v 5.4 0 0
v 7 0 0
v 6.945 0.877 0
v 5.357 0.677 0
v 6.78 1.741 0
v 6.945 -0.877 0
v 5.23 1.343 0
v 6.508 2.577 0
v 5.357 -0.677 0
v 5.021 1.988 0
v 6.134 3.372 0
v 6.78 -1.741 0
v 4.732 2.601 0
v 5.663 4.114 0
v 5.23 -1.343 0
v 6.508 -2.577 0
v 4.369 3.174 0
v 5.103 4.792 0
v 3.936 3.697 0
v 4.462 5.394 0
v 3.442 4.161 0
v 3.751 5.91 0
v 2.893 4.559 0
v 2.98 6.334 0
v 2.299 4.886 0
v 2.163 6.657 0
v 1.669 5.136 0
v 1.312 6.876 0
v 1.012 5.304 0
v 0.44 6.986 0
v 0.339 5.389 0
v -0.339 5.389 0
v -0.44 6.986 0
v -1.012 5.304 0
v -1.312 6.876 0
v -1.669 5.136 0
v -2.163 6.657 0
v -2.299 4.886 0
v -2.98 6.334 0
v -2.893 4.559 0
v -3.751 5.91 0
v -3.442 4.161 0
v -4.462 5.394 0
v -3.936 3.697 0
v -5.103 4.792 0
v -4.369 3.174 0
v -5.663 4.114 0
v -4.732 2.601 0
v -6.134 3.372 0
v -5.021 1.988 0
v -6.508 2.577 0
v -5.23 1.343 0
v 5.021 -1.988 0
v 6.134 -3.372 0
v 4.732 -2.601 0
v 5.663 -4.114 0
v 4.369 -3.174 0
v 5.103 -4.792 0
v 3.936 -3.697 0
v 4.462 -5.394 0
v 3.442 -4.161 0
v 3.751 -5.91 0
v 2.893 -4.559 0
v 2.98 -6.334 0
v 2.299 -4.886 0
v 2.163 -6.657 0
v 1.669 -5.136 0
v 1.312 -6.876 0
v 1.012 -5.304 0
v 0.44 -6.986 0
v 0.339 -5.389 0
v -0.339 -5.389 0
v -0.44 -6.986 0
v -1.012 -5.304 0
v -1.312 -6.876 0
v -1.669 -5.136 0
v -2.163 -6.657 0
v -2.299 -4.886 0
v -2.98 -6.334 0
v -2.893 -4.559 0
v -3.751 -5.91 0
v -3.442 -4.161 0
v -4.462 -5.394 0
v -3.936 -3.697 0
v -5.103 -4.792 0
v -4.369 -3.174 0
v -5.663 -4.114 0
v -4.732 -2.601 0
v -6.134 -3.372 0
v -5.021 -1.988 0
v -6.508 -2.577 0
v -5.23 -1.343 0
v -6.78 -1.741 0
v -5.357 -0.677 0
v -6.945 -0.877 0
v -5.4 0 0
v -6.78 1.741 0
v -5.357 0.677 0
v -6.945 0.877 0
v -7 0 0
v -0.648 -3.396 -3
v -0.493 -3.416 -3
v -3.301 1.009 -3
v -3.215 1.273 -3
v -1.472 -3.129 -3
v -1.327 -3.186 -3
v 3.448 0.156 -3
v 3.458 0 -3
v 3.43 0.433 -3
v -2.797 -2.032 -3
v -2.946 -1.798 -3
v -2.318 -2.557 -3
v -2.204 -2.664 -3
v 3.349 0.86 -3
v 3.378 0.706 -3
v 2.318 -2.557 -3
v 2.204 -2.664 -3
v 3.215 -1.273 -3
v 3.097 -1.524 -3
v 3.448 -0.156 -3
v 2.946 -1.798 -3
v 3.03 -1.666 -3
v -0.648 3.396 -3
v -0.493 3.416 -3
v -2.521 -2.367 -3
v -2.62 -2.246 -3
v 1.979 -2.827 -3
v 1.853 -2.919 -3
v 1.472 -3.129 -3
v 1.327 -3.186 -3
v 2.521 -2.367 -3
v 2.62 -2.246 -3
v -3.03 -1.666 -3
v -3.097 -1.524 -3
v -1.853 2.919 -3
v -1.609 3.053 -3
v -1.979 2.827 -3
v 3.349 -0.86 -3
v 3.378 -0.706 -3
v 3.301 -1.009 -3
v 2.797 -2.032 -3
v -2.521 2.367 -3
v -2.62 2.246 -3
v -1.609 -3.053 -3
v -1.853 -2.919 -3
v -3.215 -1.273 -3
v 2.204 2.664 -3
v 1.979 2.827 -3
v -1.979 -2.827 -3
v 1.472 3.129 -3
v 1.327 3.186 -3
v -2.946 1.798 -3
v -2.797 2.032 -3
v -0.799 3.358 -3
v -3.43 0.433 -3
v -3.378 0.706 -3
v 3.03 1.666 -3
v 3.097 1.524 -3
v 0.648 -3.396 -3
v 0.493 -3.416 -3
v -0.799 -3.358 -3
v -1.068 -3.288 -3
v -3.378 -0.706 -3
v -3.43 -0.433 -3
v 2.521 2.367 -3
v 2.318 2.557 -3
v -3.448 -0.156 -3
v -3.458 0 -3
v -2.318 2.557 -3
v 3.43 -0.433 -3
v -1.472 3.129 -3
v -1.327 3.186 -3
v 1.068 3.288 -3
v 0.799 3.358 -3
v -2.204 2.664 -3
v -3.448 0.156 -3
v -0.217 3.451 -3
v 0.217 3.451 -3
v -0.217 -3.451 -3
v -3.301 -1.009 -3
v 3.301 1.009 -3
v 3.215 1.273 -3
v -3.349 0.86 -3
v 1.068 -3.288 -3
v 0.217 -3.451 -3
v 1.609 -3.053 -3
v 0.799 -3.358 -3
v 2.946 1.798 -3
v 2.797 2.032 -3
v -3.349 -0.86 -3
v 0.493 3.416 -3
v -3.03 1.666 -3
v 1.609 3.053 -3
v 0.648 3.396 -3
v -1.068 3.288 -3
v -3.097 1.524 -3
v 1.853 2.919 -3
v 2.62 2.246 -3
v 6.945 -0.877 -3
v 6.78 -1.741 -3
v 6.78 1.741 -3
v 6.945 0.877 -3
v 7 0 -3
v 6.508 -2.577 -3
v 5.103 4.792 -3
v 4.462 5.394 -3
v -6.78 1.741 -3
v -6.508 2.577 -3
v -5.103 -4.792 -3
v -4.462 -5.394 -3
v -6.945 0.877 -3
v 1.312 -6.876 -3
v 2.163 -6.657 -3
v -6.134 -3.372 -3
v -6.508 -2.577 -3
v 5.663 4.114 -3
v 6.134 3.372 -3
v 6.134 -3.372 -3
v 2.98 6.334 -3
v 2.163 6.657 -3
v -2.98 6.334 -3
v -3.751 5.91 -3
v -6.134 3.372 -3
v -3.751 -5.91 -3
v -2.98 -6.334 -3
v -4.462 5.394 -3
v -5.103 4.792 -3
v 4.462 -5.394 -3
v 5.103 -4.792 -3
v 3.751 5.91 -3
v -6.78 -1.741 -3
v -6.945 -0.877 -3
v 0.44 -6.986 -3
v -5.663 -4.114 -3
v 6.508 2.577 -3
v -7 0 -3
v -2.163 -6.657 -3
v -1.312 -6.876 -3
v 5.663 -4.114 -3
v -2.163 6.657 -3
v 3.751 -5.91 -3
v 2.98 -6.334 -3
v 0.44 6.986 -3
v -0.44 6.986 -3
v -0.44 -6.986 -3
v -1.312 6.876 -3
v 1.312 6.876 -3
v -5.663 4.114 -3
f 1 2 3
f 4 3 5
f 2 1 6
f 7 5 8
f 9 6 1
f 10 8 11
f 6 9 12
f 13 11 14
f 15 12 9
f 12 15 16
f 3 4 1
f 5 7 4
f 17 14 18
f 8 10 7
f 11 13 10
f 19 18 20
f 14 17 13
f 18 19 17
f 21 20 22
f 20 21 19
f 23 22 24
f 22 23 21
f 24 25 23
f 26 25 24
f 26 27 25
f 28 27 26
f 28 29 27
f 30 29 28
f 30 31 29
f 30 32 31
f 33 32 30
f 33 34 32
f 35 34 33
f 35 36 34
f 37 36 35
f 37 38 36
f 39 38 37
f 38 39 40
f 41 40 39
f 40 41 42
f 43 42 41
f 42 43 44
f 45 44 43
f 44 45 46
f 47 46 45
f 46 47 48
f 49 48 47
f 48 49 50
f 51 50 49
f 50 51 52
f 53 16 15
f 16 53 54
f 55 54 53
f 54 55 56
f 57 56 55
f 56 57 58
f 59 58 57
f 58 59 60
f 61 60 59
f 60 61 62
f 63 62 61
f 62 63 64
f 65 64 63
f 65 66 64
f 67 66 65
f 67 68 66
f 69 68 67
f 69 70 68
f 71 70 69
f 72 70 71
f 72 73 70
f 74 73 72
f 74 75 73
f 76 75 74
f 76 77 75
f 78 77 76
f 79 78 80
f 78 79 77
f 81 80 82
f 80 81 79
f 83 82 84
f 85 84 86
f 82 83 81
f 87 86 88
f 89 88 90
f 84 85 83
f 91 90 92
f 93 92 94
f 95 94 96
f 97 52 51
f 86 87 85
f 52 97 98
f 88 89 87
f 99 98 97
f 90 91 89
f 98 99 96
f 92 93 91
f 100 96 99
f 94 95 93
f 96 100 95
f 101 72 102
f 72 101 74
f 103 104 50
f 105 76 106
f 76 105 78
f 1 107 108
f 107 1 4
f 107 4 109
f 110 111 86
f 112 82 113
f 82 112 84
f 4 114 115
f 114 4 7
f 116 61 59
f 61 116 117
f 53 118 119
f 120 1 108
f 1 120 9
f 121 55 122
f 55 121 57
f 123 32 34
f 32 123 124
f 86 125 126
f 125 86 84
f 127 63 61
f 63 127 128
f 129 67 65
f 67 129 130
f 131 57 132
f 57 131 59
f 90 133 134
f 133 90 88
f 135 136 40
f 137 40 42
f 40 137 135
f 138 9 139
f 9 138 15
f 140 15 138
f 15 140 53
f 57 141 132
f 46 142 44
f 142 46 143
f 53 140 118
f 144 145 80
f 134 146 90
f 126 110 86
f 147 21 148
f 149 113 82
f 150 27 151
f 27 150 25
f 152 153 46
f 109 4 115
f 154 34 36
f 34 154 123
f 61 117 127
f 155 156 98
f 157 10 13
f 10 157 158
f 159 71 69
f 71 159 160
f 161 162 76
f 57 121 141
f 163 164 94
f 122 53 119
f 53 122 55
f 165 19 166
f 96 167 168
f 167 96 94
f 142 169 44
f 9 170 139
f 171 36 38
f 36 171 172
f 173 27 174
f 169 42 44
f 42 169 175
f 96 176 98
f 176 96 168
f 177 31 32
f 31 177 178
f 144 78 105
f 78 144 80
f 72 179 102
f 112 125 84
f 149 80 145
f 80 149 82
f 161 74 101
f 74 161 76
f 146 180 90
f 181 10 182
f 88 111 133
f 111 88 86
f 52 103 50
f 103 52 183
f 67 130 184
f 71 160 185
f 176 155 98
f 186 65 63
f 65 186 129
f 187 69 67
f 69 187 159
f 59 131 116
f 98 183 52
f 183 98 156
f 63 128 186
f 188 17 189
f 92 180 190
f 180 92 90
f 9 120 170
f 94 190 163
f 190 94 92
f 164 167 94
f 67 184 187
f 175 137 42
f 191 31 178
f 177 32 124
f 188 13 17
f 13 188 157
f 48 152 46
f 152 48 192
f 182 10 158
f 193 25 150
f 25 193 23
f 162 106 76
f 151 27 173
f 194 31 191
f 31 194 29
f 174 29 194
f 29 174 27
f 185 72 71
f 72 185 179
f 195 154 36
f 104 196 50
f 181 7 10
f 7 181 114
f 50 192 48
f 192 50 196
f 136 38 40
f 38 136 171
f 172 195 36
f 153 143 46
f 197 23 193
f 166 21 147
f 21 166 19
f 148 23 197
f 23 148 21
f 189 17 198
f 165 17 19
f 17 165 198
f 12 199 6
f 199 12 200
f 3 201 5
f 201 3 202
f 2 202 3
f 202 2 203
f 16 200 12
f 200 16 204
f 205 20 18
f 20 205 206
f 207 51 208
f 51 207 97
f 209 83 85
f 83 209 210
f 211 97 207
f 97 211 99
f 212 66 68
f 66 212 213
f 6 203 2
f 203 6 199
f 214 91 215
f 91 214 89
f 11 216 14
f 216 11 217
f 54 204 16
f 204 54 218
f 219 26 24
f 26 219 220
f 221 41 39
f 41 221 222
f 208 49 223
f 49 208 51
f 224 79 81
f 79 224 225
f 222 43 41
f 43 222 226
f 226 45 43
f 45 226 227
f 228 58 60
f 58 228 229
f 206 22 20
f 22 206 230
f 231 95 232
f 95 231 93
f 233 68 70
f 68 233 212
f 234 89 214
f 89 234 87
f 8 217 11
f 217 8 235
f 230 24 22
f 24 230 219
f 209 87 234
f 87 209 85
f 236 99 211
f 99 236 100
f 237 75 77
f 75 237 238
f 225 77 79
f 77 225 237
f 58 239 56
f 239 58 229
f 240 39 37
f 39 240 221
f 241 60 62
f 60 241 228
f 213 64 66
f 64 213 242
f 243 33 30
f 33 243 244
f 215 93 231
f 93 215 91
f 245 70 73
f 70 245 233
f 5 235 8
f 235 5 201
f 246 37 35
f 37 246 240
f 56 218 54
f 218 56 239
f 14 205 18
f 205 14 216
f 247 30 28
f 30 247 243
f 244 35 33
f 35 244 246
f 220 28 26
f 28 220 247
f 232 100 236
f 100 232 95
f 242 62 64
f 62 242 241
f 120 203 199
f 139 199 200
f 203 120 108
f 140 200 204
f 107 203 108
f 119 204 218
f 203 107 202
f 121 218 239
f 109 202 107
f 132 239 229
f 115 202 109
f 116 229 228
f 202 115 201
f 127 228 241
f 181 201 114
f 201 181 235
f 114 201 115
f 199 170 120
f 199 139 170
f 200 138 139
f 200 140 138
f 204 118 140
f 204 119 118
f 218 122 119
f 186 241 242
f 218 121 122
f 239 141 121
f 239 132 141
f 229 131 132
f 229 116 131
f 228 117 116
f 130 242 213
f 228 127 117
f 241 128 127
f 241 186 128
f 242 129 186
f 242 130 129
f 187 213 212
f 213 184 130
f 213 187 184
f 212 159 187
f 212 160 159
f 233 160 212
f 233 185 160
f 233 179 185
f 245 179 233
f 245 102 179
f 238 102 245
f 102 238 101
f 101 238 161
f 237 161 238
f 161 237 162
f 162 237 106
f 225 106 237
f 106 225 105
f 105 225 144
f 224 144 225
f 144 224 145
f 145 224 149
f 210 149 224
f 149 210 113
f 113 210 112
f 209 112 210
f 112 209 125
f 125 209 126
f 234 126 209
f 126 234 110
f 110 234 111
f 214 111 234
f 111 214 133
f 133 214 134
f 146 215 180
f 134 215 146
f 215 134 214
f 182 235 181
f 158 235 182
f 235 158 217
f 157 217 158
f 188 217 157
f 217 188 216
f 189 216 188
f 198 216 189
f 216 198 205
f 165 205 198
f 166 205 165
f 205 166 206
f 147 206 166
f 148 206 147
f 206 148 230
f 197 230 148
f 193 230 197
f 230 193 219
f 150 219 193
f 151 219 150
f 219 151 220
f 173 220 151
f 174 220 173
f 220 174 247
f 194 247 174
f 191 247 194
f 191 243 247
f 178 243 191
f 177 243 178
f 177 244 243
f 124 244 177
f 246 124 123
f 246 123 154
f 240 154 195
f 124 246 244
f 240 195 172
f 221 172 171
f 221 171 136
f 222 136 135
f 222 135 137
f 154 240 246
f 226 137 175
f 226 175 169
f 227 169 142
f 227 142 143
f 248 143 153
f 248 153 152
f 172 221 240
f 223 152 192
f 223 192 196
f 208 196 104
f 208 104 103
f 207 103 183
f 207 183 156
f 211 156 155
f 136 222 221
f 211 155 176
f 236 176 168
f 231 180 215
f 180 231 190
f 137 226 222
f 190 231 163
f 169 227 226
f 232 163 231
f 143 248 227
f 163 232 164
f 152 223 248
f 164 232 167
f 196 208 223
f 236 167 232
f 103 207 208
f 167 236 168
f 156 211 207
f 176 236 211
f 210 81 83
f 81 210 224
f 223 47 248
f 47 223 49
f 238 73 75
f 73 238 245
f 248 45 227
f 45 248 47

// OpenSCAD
$fn = 50;

difference() {
	union() {
		translate(v = [0, 0, -3.0]) {
			cylinder(h = 3, r = 7.0);
		}
	}
	union() {
		translate(v = [0, 0, 0]) {
			rotate(a = [0, 0, 0]) {
				difference() {
					union() {
						translate(v = [0, 0, -6.0]) {
							cylinder(h = 6, r = 2.6);
						}
						translate(v = [0, 0, -3.9]) {
							cylinder(h = 3.9, r1 = 2.875, r2 = 5.4);
						}
						translate(v = [0, 0, -6.0]) {
							cylinder(h = 6, r = 2.875);
						}
						translate(v = [0, 0, -6.0]) {
							cylinder(h = 6, r = 2.6);
						}
					}
					union();
				}
			}
		}
	}
}
